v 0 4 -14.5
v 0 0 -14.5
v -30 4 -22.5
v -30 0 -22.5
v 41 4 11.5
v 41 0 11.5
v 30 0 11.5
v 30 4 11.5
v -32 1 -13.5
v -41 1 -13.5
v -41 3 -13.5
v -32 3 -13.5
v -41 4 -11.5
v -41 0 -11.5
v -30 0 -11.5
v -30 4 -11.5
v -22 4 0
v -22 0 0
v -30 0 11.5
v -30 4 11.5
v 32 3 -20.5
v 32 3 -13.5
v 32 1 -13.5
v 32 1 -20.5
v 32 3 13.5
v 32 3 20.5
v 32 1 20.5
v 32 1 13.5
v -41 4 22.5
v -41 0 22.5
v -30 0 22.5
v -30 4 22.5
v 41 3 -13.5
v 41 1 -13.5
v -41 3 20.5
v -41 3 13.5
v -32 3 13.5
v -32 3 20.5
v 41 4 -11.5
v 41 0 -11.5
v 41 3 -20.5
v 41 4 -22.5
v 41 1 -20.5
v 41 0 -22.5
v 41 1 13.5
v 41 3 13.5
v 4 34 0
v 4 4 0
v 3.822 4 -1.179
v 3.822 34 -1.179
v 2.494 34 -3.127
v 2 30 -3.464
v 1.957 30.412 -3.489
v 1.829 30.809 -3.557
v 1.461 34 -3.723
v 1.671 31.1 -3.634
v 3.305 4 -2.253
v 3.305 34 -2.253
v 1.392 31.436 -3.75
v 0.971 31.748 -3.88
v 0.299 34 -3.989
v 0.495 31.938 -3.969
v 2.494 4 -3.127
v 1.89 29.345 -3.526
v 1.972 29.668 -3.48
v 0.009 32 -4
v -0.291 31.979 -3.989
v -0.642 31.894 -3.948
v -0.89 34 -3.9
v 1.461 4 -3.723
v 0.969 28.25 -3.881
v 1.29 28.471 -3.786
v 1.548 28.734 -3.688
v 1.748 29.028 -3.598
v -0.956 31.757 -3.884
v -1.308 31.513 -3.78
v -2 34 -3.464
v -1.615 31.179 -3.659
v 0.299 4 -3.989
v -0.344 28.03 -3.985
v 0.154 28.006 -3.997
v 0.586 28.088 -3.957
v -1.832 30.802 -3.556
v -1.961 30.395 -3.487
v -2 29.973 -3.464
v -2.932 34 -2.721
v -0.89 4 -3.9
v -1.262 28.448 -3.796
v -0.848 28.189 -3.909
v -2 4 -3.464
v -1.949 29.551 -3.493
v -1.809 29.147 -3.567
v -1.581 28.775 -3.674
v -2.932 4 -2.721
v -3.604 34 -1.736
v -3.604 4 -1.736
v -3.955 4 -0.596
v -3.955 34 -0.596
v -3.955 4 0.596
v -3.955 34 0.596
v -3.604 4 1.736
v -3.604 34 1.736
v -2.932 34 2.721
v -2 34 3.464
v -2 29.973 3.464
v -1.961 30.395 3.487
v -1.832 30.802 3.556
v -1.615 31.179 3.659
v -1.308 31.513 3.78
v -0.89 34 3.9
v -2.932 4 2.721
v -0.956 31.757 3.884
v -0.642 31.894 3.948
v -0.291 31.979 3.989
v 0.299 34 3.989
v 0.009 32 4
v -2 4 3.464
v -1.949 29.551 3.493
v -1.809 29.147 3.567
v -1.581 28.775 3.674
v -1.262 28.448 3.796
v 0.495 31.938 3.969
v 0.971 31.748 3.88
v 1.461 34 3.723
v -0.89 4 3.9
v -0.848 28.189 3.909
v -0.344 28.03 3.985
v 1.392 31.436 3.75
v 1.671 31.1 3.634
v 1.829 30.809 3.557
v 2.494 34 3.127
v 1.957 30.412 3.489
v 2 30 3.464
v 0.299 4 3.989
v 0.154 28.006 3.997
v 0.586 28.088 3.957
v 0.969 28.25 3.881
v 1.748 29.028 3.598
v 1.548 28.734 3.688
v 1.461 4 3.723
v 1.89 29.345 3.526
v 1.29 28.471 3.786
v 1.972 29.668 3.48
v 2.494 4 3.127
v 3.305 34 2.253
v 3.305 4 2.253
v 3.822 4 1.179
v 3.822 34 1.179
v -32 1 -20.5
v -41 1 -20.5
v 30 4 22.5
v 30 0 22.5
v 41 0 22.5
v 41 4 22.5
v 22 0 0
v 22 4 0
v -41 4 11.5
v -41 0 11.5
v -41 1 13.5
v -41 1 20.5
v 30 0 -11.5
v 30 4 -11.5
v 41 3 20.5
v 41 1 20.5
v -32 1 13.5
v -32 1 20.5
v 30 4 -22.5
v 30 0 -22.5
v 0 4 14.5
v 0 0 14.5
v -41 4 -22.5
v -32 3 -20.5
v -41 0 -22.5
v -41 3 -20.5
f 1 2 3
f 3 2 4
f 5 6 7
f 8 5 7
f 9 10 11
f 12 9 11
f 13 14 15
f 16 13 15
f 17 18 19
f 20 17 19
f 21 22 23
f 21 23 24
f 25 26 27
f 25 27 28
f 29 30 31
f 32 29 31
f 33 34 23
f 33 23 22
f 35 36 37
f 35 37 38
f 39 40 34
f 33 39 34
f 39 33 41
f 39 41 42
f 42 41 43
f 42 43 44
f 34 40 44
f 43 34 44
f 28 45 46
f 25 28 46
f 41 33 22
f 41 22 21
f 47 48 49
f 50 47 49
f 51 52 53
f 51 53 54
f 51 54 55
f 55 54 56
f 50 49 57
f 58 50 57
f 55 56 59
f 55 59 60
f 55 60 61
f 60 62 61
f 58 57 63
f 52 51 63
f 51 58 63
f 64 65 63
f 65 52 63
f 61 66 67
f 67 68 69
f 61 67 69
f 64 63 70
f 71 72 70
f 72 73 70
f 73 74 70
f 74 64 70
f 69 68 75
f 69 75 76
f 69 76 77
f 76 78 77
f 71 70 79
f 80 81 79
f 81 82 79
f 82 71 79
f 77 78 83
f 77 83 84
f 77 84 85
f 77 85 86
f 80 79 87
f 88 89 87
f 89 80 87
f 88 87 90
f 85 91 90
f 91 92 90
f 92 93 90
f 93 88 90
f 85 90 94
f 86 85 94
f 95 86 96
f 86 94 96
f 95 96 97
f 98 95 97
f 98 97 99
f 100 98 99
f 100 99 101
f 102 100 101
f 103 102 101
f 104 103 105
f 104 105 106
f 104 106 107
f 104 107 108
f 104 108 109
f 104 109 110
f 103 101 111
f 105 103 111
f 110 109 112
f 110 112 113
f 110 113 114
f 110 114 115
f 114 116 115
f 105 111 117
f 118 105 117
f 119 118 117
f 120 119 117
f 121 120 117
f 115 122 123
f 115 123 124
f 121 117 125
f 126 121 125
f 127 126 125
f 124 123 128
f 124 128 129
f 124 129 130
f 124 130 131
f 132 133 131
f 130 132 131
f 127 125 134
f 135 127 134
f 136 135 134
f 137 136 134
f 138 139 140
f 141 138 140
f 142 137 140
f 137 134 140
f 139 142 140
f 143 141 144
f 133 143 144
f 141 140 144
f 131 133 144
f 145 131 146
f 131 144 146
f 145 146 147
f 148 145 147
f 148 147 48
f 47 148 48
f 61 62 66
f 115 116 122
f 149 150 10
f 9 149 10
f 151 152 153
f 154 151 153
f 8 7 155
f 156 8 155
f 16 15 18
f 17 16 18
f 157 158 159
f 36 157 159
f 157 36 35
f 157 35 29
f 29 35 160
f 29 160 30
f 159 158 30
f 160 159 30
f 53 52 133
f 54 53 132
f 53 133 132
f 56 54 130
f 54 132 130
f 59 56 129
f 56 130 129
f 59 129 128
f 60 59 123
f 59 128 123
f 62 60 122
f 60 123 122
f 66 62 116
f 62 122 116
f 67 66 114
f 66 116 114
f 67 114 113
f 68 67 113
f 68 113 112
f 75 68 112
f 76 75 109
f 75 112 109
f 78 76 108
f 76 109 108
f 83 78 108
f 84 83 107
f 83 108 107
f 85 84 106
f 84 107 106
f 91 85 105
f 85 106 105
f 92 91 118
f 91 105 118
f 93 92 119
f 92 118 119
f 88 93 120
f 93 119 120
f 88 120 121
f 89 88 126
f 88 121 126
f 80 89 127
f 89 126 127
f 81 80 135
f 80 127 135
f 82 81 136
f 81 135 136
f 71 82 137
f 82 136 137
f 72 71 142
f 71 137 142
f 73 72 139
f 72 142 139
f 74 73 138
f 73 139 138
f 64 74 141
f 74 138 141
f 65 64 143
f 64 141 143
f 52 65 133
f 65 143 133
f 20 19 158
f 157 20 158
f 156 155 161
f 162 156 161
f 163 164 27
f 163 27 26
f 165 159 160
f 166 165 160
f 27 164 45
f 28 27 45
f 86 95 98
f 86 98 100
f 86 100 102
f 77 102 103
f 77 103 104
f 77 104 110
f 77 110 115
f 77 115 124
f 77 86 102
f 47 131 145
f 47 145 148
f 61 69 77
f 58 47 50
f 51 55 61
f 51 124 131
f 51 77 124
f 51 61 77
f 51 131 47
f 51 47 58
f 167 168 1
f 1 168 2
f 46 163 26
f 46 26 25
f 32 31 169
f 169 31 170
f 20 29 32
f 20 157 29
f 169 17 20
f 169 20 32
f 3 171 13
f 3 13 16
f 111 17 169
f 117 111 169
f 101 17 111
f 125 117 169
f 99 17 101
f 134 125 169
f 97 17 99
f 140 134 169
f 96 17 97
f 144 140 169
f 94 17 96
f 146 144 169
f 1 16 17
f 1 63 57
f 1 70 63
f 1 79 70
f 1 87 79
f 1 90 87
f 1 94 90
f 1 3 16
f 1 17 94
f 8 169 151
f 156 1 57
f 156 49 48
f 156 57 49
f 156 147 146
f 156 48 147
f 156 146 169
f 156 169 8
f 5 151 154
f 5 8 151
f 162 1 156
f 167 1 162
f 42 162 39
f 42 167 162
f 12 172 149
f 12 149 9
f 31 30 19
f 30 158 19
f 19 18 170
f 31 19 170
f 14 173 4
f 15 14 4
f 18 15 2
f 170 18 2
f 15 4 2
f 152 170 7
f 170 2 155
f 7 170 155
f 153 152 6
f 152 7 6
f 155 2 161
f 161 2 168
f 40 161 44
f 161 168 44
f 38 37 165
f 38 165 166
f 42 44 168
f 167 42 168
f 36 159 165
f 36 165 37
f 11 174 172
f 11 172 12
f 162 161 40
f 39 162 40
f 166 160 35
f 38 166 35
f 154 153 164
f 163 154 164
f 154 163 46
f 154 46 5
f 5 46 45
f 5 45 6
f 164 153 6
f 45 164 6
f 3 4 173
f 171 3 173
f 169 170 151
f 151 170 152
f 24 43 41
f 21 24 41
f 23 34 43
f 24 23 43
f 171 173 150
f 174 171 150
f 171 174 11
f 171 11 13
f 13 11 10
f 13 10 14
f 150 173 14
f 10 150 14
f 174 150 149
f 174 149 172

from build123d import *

# Parameters (mm, degrees)
SALIENTE_EXTRUIR1_DEPTH    = 4
CROQUIS4_W                 = 7
CROQUIS4_H                 = 2
CORTAR_EXTRUIR2_DEPTH      = 9
CROQUIS6_W                 = 7
CROQUIS6_H                 = 2
CORTAR_EXTRUIR6_DEPTH      = 9
CROQUIS7_W                 = 7
CROQUIS7_H                 = 2
CORTAR_EXTRUIR4_DEPTH      = 9
CROQUIS8_W                 = 7
CROQUIS8_H                 = 2
CORTAR_EXTRUIR5_DEPTH      = 9
CROQUIS9_R                 = 4
SALIENTE_EXTRUIR2_DEPTH    = 30
CROQUIS10_R                = 2
CORTAR_EXTRUIR7_DEPTH      = 23.5
CORTAR_EXTRUIR7_DEPTH_BACK = 23.5


with BuildPart() as part:
    # Croquis1 → Saliente-Extruir1 (new body)
    with BuildSketch(Plane(origin=(0, 0, 0), x_dir=(1, 0, 0), z_dir=(0, 1, 0))):
        Polygon((-41, -22.5), (-30, -22.5), (0, -14.5), (30, -22.5), (41, -22.5), (41, -11.5), (30, -11.5), (22, 0), (30, 11.5), (41, 11.5), (41, 22.5), (30, 22.5), (0, 14.5), (-30, 22.5), (-41, 22.5), (-41, 11.5), (-30, 11.5), (-22, 0), (-30, -11.5), (-41, -11.5), align=None)
    extrude(amount=SALIENTE_EXTRUIR1_DEPTH)

    # Croquis4 → Cortar-Extruir2 (cut)
    with BuildSketch(Plane.ZY.offset(41)):
        with Locations((-17, 2)):
            Rectangle(CROQUIS4_W, CROQUIS4_H)
    extrude(amount=-CORTAR_EXTRUIR2_DEPTH, mode=Mode.SUBTRACT)

    # Croquis6 → Cortar-Extruir6 (cut)
    with BuildSketch(Plane.ZY.offset(41)):
        with Locations((17, 2)):
            Rectangle(CROQUIS6_W, CROQUIS6_H)
    extrude(amount=-CORTAR_EXTRUIR6_DEPTH, mode=Mode.SUBTRACT)

    # Croquis7 → Cortar-Extruir4 (cut)
    with BuildSketch(Plane(origin=(41, 0, 0), x_dir=(0, 0, -1), z_dir=(1, 0, 0))):
        with Locations((-17, 2)):
            Rectangle(CROQUIS7_W, CROQUIS7_H)
    extrude(amount=-CORTAR_EXTRUIR4_DEPTH, mode=Mode.SUBTRACT)

    # Croquis8 → Cortar-Extruir5 (cut)
    with BuildSketch(Plane(origin=(41, 0, 0), x_dir=(0, 0, -1), z_dir=(1, 0, 0))):
        with Locations((17, 2)):
            Rectangle(CROQUIS8_W, CROQUIS8_H)
    extrude(amount=-CORTAR_EXTRUIR5_DEPTH, mode=Mode.SUBTRACT)

    # Croquis9 → Saliente-Extruir2 (add)
    with BuildSketch(Plane(origin=(0, 4, 0), x_dir=(1, 0, 0), z_dir=(0, 1, 0))):
        Circle(CROQUIS9_R)
    extrude(amount=SALIENTE_EXTRUIR2_DEPTH)

    # Croquis10 → Cortar-Extruir7 (cut, two sides)
    with BuildSketch(Plane.XY) as cortar_extruir7_sk:
        with Locations((0, 30)):
            Circle(CROQUIS10_R)
    extrude(amount=CORTAR_EXTRUIR7_DEPTH, mode=Mode.SUBTRACT)
    extrude(cortar_extruir7_sk.sketch, amount=-CORTAR_EXTRUIR7_DEPTH_BACK, mode=Mode.SUBTRACT)


solid = part.part
